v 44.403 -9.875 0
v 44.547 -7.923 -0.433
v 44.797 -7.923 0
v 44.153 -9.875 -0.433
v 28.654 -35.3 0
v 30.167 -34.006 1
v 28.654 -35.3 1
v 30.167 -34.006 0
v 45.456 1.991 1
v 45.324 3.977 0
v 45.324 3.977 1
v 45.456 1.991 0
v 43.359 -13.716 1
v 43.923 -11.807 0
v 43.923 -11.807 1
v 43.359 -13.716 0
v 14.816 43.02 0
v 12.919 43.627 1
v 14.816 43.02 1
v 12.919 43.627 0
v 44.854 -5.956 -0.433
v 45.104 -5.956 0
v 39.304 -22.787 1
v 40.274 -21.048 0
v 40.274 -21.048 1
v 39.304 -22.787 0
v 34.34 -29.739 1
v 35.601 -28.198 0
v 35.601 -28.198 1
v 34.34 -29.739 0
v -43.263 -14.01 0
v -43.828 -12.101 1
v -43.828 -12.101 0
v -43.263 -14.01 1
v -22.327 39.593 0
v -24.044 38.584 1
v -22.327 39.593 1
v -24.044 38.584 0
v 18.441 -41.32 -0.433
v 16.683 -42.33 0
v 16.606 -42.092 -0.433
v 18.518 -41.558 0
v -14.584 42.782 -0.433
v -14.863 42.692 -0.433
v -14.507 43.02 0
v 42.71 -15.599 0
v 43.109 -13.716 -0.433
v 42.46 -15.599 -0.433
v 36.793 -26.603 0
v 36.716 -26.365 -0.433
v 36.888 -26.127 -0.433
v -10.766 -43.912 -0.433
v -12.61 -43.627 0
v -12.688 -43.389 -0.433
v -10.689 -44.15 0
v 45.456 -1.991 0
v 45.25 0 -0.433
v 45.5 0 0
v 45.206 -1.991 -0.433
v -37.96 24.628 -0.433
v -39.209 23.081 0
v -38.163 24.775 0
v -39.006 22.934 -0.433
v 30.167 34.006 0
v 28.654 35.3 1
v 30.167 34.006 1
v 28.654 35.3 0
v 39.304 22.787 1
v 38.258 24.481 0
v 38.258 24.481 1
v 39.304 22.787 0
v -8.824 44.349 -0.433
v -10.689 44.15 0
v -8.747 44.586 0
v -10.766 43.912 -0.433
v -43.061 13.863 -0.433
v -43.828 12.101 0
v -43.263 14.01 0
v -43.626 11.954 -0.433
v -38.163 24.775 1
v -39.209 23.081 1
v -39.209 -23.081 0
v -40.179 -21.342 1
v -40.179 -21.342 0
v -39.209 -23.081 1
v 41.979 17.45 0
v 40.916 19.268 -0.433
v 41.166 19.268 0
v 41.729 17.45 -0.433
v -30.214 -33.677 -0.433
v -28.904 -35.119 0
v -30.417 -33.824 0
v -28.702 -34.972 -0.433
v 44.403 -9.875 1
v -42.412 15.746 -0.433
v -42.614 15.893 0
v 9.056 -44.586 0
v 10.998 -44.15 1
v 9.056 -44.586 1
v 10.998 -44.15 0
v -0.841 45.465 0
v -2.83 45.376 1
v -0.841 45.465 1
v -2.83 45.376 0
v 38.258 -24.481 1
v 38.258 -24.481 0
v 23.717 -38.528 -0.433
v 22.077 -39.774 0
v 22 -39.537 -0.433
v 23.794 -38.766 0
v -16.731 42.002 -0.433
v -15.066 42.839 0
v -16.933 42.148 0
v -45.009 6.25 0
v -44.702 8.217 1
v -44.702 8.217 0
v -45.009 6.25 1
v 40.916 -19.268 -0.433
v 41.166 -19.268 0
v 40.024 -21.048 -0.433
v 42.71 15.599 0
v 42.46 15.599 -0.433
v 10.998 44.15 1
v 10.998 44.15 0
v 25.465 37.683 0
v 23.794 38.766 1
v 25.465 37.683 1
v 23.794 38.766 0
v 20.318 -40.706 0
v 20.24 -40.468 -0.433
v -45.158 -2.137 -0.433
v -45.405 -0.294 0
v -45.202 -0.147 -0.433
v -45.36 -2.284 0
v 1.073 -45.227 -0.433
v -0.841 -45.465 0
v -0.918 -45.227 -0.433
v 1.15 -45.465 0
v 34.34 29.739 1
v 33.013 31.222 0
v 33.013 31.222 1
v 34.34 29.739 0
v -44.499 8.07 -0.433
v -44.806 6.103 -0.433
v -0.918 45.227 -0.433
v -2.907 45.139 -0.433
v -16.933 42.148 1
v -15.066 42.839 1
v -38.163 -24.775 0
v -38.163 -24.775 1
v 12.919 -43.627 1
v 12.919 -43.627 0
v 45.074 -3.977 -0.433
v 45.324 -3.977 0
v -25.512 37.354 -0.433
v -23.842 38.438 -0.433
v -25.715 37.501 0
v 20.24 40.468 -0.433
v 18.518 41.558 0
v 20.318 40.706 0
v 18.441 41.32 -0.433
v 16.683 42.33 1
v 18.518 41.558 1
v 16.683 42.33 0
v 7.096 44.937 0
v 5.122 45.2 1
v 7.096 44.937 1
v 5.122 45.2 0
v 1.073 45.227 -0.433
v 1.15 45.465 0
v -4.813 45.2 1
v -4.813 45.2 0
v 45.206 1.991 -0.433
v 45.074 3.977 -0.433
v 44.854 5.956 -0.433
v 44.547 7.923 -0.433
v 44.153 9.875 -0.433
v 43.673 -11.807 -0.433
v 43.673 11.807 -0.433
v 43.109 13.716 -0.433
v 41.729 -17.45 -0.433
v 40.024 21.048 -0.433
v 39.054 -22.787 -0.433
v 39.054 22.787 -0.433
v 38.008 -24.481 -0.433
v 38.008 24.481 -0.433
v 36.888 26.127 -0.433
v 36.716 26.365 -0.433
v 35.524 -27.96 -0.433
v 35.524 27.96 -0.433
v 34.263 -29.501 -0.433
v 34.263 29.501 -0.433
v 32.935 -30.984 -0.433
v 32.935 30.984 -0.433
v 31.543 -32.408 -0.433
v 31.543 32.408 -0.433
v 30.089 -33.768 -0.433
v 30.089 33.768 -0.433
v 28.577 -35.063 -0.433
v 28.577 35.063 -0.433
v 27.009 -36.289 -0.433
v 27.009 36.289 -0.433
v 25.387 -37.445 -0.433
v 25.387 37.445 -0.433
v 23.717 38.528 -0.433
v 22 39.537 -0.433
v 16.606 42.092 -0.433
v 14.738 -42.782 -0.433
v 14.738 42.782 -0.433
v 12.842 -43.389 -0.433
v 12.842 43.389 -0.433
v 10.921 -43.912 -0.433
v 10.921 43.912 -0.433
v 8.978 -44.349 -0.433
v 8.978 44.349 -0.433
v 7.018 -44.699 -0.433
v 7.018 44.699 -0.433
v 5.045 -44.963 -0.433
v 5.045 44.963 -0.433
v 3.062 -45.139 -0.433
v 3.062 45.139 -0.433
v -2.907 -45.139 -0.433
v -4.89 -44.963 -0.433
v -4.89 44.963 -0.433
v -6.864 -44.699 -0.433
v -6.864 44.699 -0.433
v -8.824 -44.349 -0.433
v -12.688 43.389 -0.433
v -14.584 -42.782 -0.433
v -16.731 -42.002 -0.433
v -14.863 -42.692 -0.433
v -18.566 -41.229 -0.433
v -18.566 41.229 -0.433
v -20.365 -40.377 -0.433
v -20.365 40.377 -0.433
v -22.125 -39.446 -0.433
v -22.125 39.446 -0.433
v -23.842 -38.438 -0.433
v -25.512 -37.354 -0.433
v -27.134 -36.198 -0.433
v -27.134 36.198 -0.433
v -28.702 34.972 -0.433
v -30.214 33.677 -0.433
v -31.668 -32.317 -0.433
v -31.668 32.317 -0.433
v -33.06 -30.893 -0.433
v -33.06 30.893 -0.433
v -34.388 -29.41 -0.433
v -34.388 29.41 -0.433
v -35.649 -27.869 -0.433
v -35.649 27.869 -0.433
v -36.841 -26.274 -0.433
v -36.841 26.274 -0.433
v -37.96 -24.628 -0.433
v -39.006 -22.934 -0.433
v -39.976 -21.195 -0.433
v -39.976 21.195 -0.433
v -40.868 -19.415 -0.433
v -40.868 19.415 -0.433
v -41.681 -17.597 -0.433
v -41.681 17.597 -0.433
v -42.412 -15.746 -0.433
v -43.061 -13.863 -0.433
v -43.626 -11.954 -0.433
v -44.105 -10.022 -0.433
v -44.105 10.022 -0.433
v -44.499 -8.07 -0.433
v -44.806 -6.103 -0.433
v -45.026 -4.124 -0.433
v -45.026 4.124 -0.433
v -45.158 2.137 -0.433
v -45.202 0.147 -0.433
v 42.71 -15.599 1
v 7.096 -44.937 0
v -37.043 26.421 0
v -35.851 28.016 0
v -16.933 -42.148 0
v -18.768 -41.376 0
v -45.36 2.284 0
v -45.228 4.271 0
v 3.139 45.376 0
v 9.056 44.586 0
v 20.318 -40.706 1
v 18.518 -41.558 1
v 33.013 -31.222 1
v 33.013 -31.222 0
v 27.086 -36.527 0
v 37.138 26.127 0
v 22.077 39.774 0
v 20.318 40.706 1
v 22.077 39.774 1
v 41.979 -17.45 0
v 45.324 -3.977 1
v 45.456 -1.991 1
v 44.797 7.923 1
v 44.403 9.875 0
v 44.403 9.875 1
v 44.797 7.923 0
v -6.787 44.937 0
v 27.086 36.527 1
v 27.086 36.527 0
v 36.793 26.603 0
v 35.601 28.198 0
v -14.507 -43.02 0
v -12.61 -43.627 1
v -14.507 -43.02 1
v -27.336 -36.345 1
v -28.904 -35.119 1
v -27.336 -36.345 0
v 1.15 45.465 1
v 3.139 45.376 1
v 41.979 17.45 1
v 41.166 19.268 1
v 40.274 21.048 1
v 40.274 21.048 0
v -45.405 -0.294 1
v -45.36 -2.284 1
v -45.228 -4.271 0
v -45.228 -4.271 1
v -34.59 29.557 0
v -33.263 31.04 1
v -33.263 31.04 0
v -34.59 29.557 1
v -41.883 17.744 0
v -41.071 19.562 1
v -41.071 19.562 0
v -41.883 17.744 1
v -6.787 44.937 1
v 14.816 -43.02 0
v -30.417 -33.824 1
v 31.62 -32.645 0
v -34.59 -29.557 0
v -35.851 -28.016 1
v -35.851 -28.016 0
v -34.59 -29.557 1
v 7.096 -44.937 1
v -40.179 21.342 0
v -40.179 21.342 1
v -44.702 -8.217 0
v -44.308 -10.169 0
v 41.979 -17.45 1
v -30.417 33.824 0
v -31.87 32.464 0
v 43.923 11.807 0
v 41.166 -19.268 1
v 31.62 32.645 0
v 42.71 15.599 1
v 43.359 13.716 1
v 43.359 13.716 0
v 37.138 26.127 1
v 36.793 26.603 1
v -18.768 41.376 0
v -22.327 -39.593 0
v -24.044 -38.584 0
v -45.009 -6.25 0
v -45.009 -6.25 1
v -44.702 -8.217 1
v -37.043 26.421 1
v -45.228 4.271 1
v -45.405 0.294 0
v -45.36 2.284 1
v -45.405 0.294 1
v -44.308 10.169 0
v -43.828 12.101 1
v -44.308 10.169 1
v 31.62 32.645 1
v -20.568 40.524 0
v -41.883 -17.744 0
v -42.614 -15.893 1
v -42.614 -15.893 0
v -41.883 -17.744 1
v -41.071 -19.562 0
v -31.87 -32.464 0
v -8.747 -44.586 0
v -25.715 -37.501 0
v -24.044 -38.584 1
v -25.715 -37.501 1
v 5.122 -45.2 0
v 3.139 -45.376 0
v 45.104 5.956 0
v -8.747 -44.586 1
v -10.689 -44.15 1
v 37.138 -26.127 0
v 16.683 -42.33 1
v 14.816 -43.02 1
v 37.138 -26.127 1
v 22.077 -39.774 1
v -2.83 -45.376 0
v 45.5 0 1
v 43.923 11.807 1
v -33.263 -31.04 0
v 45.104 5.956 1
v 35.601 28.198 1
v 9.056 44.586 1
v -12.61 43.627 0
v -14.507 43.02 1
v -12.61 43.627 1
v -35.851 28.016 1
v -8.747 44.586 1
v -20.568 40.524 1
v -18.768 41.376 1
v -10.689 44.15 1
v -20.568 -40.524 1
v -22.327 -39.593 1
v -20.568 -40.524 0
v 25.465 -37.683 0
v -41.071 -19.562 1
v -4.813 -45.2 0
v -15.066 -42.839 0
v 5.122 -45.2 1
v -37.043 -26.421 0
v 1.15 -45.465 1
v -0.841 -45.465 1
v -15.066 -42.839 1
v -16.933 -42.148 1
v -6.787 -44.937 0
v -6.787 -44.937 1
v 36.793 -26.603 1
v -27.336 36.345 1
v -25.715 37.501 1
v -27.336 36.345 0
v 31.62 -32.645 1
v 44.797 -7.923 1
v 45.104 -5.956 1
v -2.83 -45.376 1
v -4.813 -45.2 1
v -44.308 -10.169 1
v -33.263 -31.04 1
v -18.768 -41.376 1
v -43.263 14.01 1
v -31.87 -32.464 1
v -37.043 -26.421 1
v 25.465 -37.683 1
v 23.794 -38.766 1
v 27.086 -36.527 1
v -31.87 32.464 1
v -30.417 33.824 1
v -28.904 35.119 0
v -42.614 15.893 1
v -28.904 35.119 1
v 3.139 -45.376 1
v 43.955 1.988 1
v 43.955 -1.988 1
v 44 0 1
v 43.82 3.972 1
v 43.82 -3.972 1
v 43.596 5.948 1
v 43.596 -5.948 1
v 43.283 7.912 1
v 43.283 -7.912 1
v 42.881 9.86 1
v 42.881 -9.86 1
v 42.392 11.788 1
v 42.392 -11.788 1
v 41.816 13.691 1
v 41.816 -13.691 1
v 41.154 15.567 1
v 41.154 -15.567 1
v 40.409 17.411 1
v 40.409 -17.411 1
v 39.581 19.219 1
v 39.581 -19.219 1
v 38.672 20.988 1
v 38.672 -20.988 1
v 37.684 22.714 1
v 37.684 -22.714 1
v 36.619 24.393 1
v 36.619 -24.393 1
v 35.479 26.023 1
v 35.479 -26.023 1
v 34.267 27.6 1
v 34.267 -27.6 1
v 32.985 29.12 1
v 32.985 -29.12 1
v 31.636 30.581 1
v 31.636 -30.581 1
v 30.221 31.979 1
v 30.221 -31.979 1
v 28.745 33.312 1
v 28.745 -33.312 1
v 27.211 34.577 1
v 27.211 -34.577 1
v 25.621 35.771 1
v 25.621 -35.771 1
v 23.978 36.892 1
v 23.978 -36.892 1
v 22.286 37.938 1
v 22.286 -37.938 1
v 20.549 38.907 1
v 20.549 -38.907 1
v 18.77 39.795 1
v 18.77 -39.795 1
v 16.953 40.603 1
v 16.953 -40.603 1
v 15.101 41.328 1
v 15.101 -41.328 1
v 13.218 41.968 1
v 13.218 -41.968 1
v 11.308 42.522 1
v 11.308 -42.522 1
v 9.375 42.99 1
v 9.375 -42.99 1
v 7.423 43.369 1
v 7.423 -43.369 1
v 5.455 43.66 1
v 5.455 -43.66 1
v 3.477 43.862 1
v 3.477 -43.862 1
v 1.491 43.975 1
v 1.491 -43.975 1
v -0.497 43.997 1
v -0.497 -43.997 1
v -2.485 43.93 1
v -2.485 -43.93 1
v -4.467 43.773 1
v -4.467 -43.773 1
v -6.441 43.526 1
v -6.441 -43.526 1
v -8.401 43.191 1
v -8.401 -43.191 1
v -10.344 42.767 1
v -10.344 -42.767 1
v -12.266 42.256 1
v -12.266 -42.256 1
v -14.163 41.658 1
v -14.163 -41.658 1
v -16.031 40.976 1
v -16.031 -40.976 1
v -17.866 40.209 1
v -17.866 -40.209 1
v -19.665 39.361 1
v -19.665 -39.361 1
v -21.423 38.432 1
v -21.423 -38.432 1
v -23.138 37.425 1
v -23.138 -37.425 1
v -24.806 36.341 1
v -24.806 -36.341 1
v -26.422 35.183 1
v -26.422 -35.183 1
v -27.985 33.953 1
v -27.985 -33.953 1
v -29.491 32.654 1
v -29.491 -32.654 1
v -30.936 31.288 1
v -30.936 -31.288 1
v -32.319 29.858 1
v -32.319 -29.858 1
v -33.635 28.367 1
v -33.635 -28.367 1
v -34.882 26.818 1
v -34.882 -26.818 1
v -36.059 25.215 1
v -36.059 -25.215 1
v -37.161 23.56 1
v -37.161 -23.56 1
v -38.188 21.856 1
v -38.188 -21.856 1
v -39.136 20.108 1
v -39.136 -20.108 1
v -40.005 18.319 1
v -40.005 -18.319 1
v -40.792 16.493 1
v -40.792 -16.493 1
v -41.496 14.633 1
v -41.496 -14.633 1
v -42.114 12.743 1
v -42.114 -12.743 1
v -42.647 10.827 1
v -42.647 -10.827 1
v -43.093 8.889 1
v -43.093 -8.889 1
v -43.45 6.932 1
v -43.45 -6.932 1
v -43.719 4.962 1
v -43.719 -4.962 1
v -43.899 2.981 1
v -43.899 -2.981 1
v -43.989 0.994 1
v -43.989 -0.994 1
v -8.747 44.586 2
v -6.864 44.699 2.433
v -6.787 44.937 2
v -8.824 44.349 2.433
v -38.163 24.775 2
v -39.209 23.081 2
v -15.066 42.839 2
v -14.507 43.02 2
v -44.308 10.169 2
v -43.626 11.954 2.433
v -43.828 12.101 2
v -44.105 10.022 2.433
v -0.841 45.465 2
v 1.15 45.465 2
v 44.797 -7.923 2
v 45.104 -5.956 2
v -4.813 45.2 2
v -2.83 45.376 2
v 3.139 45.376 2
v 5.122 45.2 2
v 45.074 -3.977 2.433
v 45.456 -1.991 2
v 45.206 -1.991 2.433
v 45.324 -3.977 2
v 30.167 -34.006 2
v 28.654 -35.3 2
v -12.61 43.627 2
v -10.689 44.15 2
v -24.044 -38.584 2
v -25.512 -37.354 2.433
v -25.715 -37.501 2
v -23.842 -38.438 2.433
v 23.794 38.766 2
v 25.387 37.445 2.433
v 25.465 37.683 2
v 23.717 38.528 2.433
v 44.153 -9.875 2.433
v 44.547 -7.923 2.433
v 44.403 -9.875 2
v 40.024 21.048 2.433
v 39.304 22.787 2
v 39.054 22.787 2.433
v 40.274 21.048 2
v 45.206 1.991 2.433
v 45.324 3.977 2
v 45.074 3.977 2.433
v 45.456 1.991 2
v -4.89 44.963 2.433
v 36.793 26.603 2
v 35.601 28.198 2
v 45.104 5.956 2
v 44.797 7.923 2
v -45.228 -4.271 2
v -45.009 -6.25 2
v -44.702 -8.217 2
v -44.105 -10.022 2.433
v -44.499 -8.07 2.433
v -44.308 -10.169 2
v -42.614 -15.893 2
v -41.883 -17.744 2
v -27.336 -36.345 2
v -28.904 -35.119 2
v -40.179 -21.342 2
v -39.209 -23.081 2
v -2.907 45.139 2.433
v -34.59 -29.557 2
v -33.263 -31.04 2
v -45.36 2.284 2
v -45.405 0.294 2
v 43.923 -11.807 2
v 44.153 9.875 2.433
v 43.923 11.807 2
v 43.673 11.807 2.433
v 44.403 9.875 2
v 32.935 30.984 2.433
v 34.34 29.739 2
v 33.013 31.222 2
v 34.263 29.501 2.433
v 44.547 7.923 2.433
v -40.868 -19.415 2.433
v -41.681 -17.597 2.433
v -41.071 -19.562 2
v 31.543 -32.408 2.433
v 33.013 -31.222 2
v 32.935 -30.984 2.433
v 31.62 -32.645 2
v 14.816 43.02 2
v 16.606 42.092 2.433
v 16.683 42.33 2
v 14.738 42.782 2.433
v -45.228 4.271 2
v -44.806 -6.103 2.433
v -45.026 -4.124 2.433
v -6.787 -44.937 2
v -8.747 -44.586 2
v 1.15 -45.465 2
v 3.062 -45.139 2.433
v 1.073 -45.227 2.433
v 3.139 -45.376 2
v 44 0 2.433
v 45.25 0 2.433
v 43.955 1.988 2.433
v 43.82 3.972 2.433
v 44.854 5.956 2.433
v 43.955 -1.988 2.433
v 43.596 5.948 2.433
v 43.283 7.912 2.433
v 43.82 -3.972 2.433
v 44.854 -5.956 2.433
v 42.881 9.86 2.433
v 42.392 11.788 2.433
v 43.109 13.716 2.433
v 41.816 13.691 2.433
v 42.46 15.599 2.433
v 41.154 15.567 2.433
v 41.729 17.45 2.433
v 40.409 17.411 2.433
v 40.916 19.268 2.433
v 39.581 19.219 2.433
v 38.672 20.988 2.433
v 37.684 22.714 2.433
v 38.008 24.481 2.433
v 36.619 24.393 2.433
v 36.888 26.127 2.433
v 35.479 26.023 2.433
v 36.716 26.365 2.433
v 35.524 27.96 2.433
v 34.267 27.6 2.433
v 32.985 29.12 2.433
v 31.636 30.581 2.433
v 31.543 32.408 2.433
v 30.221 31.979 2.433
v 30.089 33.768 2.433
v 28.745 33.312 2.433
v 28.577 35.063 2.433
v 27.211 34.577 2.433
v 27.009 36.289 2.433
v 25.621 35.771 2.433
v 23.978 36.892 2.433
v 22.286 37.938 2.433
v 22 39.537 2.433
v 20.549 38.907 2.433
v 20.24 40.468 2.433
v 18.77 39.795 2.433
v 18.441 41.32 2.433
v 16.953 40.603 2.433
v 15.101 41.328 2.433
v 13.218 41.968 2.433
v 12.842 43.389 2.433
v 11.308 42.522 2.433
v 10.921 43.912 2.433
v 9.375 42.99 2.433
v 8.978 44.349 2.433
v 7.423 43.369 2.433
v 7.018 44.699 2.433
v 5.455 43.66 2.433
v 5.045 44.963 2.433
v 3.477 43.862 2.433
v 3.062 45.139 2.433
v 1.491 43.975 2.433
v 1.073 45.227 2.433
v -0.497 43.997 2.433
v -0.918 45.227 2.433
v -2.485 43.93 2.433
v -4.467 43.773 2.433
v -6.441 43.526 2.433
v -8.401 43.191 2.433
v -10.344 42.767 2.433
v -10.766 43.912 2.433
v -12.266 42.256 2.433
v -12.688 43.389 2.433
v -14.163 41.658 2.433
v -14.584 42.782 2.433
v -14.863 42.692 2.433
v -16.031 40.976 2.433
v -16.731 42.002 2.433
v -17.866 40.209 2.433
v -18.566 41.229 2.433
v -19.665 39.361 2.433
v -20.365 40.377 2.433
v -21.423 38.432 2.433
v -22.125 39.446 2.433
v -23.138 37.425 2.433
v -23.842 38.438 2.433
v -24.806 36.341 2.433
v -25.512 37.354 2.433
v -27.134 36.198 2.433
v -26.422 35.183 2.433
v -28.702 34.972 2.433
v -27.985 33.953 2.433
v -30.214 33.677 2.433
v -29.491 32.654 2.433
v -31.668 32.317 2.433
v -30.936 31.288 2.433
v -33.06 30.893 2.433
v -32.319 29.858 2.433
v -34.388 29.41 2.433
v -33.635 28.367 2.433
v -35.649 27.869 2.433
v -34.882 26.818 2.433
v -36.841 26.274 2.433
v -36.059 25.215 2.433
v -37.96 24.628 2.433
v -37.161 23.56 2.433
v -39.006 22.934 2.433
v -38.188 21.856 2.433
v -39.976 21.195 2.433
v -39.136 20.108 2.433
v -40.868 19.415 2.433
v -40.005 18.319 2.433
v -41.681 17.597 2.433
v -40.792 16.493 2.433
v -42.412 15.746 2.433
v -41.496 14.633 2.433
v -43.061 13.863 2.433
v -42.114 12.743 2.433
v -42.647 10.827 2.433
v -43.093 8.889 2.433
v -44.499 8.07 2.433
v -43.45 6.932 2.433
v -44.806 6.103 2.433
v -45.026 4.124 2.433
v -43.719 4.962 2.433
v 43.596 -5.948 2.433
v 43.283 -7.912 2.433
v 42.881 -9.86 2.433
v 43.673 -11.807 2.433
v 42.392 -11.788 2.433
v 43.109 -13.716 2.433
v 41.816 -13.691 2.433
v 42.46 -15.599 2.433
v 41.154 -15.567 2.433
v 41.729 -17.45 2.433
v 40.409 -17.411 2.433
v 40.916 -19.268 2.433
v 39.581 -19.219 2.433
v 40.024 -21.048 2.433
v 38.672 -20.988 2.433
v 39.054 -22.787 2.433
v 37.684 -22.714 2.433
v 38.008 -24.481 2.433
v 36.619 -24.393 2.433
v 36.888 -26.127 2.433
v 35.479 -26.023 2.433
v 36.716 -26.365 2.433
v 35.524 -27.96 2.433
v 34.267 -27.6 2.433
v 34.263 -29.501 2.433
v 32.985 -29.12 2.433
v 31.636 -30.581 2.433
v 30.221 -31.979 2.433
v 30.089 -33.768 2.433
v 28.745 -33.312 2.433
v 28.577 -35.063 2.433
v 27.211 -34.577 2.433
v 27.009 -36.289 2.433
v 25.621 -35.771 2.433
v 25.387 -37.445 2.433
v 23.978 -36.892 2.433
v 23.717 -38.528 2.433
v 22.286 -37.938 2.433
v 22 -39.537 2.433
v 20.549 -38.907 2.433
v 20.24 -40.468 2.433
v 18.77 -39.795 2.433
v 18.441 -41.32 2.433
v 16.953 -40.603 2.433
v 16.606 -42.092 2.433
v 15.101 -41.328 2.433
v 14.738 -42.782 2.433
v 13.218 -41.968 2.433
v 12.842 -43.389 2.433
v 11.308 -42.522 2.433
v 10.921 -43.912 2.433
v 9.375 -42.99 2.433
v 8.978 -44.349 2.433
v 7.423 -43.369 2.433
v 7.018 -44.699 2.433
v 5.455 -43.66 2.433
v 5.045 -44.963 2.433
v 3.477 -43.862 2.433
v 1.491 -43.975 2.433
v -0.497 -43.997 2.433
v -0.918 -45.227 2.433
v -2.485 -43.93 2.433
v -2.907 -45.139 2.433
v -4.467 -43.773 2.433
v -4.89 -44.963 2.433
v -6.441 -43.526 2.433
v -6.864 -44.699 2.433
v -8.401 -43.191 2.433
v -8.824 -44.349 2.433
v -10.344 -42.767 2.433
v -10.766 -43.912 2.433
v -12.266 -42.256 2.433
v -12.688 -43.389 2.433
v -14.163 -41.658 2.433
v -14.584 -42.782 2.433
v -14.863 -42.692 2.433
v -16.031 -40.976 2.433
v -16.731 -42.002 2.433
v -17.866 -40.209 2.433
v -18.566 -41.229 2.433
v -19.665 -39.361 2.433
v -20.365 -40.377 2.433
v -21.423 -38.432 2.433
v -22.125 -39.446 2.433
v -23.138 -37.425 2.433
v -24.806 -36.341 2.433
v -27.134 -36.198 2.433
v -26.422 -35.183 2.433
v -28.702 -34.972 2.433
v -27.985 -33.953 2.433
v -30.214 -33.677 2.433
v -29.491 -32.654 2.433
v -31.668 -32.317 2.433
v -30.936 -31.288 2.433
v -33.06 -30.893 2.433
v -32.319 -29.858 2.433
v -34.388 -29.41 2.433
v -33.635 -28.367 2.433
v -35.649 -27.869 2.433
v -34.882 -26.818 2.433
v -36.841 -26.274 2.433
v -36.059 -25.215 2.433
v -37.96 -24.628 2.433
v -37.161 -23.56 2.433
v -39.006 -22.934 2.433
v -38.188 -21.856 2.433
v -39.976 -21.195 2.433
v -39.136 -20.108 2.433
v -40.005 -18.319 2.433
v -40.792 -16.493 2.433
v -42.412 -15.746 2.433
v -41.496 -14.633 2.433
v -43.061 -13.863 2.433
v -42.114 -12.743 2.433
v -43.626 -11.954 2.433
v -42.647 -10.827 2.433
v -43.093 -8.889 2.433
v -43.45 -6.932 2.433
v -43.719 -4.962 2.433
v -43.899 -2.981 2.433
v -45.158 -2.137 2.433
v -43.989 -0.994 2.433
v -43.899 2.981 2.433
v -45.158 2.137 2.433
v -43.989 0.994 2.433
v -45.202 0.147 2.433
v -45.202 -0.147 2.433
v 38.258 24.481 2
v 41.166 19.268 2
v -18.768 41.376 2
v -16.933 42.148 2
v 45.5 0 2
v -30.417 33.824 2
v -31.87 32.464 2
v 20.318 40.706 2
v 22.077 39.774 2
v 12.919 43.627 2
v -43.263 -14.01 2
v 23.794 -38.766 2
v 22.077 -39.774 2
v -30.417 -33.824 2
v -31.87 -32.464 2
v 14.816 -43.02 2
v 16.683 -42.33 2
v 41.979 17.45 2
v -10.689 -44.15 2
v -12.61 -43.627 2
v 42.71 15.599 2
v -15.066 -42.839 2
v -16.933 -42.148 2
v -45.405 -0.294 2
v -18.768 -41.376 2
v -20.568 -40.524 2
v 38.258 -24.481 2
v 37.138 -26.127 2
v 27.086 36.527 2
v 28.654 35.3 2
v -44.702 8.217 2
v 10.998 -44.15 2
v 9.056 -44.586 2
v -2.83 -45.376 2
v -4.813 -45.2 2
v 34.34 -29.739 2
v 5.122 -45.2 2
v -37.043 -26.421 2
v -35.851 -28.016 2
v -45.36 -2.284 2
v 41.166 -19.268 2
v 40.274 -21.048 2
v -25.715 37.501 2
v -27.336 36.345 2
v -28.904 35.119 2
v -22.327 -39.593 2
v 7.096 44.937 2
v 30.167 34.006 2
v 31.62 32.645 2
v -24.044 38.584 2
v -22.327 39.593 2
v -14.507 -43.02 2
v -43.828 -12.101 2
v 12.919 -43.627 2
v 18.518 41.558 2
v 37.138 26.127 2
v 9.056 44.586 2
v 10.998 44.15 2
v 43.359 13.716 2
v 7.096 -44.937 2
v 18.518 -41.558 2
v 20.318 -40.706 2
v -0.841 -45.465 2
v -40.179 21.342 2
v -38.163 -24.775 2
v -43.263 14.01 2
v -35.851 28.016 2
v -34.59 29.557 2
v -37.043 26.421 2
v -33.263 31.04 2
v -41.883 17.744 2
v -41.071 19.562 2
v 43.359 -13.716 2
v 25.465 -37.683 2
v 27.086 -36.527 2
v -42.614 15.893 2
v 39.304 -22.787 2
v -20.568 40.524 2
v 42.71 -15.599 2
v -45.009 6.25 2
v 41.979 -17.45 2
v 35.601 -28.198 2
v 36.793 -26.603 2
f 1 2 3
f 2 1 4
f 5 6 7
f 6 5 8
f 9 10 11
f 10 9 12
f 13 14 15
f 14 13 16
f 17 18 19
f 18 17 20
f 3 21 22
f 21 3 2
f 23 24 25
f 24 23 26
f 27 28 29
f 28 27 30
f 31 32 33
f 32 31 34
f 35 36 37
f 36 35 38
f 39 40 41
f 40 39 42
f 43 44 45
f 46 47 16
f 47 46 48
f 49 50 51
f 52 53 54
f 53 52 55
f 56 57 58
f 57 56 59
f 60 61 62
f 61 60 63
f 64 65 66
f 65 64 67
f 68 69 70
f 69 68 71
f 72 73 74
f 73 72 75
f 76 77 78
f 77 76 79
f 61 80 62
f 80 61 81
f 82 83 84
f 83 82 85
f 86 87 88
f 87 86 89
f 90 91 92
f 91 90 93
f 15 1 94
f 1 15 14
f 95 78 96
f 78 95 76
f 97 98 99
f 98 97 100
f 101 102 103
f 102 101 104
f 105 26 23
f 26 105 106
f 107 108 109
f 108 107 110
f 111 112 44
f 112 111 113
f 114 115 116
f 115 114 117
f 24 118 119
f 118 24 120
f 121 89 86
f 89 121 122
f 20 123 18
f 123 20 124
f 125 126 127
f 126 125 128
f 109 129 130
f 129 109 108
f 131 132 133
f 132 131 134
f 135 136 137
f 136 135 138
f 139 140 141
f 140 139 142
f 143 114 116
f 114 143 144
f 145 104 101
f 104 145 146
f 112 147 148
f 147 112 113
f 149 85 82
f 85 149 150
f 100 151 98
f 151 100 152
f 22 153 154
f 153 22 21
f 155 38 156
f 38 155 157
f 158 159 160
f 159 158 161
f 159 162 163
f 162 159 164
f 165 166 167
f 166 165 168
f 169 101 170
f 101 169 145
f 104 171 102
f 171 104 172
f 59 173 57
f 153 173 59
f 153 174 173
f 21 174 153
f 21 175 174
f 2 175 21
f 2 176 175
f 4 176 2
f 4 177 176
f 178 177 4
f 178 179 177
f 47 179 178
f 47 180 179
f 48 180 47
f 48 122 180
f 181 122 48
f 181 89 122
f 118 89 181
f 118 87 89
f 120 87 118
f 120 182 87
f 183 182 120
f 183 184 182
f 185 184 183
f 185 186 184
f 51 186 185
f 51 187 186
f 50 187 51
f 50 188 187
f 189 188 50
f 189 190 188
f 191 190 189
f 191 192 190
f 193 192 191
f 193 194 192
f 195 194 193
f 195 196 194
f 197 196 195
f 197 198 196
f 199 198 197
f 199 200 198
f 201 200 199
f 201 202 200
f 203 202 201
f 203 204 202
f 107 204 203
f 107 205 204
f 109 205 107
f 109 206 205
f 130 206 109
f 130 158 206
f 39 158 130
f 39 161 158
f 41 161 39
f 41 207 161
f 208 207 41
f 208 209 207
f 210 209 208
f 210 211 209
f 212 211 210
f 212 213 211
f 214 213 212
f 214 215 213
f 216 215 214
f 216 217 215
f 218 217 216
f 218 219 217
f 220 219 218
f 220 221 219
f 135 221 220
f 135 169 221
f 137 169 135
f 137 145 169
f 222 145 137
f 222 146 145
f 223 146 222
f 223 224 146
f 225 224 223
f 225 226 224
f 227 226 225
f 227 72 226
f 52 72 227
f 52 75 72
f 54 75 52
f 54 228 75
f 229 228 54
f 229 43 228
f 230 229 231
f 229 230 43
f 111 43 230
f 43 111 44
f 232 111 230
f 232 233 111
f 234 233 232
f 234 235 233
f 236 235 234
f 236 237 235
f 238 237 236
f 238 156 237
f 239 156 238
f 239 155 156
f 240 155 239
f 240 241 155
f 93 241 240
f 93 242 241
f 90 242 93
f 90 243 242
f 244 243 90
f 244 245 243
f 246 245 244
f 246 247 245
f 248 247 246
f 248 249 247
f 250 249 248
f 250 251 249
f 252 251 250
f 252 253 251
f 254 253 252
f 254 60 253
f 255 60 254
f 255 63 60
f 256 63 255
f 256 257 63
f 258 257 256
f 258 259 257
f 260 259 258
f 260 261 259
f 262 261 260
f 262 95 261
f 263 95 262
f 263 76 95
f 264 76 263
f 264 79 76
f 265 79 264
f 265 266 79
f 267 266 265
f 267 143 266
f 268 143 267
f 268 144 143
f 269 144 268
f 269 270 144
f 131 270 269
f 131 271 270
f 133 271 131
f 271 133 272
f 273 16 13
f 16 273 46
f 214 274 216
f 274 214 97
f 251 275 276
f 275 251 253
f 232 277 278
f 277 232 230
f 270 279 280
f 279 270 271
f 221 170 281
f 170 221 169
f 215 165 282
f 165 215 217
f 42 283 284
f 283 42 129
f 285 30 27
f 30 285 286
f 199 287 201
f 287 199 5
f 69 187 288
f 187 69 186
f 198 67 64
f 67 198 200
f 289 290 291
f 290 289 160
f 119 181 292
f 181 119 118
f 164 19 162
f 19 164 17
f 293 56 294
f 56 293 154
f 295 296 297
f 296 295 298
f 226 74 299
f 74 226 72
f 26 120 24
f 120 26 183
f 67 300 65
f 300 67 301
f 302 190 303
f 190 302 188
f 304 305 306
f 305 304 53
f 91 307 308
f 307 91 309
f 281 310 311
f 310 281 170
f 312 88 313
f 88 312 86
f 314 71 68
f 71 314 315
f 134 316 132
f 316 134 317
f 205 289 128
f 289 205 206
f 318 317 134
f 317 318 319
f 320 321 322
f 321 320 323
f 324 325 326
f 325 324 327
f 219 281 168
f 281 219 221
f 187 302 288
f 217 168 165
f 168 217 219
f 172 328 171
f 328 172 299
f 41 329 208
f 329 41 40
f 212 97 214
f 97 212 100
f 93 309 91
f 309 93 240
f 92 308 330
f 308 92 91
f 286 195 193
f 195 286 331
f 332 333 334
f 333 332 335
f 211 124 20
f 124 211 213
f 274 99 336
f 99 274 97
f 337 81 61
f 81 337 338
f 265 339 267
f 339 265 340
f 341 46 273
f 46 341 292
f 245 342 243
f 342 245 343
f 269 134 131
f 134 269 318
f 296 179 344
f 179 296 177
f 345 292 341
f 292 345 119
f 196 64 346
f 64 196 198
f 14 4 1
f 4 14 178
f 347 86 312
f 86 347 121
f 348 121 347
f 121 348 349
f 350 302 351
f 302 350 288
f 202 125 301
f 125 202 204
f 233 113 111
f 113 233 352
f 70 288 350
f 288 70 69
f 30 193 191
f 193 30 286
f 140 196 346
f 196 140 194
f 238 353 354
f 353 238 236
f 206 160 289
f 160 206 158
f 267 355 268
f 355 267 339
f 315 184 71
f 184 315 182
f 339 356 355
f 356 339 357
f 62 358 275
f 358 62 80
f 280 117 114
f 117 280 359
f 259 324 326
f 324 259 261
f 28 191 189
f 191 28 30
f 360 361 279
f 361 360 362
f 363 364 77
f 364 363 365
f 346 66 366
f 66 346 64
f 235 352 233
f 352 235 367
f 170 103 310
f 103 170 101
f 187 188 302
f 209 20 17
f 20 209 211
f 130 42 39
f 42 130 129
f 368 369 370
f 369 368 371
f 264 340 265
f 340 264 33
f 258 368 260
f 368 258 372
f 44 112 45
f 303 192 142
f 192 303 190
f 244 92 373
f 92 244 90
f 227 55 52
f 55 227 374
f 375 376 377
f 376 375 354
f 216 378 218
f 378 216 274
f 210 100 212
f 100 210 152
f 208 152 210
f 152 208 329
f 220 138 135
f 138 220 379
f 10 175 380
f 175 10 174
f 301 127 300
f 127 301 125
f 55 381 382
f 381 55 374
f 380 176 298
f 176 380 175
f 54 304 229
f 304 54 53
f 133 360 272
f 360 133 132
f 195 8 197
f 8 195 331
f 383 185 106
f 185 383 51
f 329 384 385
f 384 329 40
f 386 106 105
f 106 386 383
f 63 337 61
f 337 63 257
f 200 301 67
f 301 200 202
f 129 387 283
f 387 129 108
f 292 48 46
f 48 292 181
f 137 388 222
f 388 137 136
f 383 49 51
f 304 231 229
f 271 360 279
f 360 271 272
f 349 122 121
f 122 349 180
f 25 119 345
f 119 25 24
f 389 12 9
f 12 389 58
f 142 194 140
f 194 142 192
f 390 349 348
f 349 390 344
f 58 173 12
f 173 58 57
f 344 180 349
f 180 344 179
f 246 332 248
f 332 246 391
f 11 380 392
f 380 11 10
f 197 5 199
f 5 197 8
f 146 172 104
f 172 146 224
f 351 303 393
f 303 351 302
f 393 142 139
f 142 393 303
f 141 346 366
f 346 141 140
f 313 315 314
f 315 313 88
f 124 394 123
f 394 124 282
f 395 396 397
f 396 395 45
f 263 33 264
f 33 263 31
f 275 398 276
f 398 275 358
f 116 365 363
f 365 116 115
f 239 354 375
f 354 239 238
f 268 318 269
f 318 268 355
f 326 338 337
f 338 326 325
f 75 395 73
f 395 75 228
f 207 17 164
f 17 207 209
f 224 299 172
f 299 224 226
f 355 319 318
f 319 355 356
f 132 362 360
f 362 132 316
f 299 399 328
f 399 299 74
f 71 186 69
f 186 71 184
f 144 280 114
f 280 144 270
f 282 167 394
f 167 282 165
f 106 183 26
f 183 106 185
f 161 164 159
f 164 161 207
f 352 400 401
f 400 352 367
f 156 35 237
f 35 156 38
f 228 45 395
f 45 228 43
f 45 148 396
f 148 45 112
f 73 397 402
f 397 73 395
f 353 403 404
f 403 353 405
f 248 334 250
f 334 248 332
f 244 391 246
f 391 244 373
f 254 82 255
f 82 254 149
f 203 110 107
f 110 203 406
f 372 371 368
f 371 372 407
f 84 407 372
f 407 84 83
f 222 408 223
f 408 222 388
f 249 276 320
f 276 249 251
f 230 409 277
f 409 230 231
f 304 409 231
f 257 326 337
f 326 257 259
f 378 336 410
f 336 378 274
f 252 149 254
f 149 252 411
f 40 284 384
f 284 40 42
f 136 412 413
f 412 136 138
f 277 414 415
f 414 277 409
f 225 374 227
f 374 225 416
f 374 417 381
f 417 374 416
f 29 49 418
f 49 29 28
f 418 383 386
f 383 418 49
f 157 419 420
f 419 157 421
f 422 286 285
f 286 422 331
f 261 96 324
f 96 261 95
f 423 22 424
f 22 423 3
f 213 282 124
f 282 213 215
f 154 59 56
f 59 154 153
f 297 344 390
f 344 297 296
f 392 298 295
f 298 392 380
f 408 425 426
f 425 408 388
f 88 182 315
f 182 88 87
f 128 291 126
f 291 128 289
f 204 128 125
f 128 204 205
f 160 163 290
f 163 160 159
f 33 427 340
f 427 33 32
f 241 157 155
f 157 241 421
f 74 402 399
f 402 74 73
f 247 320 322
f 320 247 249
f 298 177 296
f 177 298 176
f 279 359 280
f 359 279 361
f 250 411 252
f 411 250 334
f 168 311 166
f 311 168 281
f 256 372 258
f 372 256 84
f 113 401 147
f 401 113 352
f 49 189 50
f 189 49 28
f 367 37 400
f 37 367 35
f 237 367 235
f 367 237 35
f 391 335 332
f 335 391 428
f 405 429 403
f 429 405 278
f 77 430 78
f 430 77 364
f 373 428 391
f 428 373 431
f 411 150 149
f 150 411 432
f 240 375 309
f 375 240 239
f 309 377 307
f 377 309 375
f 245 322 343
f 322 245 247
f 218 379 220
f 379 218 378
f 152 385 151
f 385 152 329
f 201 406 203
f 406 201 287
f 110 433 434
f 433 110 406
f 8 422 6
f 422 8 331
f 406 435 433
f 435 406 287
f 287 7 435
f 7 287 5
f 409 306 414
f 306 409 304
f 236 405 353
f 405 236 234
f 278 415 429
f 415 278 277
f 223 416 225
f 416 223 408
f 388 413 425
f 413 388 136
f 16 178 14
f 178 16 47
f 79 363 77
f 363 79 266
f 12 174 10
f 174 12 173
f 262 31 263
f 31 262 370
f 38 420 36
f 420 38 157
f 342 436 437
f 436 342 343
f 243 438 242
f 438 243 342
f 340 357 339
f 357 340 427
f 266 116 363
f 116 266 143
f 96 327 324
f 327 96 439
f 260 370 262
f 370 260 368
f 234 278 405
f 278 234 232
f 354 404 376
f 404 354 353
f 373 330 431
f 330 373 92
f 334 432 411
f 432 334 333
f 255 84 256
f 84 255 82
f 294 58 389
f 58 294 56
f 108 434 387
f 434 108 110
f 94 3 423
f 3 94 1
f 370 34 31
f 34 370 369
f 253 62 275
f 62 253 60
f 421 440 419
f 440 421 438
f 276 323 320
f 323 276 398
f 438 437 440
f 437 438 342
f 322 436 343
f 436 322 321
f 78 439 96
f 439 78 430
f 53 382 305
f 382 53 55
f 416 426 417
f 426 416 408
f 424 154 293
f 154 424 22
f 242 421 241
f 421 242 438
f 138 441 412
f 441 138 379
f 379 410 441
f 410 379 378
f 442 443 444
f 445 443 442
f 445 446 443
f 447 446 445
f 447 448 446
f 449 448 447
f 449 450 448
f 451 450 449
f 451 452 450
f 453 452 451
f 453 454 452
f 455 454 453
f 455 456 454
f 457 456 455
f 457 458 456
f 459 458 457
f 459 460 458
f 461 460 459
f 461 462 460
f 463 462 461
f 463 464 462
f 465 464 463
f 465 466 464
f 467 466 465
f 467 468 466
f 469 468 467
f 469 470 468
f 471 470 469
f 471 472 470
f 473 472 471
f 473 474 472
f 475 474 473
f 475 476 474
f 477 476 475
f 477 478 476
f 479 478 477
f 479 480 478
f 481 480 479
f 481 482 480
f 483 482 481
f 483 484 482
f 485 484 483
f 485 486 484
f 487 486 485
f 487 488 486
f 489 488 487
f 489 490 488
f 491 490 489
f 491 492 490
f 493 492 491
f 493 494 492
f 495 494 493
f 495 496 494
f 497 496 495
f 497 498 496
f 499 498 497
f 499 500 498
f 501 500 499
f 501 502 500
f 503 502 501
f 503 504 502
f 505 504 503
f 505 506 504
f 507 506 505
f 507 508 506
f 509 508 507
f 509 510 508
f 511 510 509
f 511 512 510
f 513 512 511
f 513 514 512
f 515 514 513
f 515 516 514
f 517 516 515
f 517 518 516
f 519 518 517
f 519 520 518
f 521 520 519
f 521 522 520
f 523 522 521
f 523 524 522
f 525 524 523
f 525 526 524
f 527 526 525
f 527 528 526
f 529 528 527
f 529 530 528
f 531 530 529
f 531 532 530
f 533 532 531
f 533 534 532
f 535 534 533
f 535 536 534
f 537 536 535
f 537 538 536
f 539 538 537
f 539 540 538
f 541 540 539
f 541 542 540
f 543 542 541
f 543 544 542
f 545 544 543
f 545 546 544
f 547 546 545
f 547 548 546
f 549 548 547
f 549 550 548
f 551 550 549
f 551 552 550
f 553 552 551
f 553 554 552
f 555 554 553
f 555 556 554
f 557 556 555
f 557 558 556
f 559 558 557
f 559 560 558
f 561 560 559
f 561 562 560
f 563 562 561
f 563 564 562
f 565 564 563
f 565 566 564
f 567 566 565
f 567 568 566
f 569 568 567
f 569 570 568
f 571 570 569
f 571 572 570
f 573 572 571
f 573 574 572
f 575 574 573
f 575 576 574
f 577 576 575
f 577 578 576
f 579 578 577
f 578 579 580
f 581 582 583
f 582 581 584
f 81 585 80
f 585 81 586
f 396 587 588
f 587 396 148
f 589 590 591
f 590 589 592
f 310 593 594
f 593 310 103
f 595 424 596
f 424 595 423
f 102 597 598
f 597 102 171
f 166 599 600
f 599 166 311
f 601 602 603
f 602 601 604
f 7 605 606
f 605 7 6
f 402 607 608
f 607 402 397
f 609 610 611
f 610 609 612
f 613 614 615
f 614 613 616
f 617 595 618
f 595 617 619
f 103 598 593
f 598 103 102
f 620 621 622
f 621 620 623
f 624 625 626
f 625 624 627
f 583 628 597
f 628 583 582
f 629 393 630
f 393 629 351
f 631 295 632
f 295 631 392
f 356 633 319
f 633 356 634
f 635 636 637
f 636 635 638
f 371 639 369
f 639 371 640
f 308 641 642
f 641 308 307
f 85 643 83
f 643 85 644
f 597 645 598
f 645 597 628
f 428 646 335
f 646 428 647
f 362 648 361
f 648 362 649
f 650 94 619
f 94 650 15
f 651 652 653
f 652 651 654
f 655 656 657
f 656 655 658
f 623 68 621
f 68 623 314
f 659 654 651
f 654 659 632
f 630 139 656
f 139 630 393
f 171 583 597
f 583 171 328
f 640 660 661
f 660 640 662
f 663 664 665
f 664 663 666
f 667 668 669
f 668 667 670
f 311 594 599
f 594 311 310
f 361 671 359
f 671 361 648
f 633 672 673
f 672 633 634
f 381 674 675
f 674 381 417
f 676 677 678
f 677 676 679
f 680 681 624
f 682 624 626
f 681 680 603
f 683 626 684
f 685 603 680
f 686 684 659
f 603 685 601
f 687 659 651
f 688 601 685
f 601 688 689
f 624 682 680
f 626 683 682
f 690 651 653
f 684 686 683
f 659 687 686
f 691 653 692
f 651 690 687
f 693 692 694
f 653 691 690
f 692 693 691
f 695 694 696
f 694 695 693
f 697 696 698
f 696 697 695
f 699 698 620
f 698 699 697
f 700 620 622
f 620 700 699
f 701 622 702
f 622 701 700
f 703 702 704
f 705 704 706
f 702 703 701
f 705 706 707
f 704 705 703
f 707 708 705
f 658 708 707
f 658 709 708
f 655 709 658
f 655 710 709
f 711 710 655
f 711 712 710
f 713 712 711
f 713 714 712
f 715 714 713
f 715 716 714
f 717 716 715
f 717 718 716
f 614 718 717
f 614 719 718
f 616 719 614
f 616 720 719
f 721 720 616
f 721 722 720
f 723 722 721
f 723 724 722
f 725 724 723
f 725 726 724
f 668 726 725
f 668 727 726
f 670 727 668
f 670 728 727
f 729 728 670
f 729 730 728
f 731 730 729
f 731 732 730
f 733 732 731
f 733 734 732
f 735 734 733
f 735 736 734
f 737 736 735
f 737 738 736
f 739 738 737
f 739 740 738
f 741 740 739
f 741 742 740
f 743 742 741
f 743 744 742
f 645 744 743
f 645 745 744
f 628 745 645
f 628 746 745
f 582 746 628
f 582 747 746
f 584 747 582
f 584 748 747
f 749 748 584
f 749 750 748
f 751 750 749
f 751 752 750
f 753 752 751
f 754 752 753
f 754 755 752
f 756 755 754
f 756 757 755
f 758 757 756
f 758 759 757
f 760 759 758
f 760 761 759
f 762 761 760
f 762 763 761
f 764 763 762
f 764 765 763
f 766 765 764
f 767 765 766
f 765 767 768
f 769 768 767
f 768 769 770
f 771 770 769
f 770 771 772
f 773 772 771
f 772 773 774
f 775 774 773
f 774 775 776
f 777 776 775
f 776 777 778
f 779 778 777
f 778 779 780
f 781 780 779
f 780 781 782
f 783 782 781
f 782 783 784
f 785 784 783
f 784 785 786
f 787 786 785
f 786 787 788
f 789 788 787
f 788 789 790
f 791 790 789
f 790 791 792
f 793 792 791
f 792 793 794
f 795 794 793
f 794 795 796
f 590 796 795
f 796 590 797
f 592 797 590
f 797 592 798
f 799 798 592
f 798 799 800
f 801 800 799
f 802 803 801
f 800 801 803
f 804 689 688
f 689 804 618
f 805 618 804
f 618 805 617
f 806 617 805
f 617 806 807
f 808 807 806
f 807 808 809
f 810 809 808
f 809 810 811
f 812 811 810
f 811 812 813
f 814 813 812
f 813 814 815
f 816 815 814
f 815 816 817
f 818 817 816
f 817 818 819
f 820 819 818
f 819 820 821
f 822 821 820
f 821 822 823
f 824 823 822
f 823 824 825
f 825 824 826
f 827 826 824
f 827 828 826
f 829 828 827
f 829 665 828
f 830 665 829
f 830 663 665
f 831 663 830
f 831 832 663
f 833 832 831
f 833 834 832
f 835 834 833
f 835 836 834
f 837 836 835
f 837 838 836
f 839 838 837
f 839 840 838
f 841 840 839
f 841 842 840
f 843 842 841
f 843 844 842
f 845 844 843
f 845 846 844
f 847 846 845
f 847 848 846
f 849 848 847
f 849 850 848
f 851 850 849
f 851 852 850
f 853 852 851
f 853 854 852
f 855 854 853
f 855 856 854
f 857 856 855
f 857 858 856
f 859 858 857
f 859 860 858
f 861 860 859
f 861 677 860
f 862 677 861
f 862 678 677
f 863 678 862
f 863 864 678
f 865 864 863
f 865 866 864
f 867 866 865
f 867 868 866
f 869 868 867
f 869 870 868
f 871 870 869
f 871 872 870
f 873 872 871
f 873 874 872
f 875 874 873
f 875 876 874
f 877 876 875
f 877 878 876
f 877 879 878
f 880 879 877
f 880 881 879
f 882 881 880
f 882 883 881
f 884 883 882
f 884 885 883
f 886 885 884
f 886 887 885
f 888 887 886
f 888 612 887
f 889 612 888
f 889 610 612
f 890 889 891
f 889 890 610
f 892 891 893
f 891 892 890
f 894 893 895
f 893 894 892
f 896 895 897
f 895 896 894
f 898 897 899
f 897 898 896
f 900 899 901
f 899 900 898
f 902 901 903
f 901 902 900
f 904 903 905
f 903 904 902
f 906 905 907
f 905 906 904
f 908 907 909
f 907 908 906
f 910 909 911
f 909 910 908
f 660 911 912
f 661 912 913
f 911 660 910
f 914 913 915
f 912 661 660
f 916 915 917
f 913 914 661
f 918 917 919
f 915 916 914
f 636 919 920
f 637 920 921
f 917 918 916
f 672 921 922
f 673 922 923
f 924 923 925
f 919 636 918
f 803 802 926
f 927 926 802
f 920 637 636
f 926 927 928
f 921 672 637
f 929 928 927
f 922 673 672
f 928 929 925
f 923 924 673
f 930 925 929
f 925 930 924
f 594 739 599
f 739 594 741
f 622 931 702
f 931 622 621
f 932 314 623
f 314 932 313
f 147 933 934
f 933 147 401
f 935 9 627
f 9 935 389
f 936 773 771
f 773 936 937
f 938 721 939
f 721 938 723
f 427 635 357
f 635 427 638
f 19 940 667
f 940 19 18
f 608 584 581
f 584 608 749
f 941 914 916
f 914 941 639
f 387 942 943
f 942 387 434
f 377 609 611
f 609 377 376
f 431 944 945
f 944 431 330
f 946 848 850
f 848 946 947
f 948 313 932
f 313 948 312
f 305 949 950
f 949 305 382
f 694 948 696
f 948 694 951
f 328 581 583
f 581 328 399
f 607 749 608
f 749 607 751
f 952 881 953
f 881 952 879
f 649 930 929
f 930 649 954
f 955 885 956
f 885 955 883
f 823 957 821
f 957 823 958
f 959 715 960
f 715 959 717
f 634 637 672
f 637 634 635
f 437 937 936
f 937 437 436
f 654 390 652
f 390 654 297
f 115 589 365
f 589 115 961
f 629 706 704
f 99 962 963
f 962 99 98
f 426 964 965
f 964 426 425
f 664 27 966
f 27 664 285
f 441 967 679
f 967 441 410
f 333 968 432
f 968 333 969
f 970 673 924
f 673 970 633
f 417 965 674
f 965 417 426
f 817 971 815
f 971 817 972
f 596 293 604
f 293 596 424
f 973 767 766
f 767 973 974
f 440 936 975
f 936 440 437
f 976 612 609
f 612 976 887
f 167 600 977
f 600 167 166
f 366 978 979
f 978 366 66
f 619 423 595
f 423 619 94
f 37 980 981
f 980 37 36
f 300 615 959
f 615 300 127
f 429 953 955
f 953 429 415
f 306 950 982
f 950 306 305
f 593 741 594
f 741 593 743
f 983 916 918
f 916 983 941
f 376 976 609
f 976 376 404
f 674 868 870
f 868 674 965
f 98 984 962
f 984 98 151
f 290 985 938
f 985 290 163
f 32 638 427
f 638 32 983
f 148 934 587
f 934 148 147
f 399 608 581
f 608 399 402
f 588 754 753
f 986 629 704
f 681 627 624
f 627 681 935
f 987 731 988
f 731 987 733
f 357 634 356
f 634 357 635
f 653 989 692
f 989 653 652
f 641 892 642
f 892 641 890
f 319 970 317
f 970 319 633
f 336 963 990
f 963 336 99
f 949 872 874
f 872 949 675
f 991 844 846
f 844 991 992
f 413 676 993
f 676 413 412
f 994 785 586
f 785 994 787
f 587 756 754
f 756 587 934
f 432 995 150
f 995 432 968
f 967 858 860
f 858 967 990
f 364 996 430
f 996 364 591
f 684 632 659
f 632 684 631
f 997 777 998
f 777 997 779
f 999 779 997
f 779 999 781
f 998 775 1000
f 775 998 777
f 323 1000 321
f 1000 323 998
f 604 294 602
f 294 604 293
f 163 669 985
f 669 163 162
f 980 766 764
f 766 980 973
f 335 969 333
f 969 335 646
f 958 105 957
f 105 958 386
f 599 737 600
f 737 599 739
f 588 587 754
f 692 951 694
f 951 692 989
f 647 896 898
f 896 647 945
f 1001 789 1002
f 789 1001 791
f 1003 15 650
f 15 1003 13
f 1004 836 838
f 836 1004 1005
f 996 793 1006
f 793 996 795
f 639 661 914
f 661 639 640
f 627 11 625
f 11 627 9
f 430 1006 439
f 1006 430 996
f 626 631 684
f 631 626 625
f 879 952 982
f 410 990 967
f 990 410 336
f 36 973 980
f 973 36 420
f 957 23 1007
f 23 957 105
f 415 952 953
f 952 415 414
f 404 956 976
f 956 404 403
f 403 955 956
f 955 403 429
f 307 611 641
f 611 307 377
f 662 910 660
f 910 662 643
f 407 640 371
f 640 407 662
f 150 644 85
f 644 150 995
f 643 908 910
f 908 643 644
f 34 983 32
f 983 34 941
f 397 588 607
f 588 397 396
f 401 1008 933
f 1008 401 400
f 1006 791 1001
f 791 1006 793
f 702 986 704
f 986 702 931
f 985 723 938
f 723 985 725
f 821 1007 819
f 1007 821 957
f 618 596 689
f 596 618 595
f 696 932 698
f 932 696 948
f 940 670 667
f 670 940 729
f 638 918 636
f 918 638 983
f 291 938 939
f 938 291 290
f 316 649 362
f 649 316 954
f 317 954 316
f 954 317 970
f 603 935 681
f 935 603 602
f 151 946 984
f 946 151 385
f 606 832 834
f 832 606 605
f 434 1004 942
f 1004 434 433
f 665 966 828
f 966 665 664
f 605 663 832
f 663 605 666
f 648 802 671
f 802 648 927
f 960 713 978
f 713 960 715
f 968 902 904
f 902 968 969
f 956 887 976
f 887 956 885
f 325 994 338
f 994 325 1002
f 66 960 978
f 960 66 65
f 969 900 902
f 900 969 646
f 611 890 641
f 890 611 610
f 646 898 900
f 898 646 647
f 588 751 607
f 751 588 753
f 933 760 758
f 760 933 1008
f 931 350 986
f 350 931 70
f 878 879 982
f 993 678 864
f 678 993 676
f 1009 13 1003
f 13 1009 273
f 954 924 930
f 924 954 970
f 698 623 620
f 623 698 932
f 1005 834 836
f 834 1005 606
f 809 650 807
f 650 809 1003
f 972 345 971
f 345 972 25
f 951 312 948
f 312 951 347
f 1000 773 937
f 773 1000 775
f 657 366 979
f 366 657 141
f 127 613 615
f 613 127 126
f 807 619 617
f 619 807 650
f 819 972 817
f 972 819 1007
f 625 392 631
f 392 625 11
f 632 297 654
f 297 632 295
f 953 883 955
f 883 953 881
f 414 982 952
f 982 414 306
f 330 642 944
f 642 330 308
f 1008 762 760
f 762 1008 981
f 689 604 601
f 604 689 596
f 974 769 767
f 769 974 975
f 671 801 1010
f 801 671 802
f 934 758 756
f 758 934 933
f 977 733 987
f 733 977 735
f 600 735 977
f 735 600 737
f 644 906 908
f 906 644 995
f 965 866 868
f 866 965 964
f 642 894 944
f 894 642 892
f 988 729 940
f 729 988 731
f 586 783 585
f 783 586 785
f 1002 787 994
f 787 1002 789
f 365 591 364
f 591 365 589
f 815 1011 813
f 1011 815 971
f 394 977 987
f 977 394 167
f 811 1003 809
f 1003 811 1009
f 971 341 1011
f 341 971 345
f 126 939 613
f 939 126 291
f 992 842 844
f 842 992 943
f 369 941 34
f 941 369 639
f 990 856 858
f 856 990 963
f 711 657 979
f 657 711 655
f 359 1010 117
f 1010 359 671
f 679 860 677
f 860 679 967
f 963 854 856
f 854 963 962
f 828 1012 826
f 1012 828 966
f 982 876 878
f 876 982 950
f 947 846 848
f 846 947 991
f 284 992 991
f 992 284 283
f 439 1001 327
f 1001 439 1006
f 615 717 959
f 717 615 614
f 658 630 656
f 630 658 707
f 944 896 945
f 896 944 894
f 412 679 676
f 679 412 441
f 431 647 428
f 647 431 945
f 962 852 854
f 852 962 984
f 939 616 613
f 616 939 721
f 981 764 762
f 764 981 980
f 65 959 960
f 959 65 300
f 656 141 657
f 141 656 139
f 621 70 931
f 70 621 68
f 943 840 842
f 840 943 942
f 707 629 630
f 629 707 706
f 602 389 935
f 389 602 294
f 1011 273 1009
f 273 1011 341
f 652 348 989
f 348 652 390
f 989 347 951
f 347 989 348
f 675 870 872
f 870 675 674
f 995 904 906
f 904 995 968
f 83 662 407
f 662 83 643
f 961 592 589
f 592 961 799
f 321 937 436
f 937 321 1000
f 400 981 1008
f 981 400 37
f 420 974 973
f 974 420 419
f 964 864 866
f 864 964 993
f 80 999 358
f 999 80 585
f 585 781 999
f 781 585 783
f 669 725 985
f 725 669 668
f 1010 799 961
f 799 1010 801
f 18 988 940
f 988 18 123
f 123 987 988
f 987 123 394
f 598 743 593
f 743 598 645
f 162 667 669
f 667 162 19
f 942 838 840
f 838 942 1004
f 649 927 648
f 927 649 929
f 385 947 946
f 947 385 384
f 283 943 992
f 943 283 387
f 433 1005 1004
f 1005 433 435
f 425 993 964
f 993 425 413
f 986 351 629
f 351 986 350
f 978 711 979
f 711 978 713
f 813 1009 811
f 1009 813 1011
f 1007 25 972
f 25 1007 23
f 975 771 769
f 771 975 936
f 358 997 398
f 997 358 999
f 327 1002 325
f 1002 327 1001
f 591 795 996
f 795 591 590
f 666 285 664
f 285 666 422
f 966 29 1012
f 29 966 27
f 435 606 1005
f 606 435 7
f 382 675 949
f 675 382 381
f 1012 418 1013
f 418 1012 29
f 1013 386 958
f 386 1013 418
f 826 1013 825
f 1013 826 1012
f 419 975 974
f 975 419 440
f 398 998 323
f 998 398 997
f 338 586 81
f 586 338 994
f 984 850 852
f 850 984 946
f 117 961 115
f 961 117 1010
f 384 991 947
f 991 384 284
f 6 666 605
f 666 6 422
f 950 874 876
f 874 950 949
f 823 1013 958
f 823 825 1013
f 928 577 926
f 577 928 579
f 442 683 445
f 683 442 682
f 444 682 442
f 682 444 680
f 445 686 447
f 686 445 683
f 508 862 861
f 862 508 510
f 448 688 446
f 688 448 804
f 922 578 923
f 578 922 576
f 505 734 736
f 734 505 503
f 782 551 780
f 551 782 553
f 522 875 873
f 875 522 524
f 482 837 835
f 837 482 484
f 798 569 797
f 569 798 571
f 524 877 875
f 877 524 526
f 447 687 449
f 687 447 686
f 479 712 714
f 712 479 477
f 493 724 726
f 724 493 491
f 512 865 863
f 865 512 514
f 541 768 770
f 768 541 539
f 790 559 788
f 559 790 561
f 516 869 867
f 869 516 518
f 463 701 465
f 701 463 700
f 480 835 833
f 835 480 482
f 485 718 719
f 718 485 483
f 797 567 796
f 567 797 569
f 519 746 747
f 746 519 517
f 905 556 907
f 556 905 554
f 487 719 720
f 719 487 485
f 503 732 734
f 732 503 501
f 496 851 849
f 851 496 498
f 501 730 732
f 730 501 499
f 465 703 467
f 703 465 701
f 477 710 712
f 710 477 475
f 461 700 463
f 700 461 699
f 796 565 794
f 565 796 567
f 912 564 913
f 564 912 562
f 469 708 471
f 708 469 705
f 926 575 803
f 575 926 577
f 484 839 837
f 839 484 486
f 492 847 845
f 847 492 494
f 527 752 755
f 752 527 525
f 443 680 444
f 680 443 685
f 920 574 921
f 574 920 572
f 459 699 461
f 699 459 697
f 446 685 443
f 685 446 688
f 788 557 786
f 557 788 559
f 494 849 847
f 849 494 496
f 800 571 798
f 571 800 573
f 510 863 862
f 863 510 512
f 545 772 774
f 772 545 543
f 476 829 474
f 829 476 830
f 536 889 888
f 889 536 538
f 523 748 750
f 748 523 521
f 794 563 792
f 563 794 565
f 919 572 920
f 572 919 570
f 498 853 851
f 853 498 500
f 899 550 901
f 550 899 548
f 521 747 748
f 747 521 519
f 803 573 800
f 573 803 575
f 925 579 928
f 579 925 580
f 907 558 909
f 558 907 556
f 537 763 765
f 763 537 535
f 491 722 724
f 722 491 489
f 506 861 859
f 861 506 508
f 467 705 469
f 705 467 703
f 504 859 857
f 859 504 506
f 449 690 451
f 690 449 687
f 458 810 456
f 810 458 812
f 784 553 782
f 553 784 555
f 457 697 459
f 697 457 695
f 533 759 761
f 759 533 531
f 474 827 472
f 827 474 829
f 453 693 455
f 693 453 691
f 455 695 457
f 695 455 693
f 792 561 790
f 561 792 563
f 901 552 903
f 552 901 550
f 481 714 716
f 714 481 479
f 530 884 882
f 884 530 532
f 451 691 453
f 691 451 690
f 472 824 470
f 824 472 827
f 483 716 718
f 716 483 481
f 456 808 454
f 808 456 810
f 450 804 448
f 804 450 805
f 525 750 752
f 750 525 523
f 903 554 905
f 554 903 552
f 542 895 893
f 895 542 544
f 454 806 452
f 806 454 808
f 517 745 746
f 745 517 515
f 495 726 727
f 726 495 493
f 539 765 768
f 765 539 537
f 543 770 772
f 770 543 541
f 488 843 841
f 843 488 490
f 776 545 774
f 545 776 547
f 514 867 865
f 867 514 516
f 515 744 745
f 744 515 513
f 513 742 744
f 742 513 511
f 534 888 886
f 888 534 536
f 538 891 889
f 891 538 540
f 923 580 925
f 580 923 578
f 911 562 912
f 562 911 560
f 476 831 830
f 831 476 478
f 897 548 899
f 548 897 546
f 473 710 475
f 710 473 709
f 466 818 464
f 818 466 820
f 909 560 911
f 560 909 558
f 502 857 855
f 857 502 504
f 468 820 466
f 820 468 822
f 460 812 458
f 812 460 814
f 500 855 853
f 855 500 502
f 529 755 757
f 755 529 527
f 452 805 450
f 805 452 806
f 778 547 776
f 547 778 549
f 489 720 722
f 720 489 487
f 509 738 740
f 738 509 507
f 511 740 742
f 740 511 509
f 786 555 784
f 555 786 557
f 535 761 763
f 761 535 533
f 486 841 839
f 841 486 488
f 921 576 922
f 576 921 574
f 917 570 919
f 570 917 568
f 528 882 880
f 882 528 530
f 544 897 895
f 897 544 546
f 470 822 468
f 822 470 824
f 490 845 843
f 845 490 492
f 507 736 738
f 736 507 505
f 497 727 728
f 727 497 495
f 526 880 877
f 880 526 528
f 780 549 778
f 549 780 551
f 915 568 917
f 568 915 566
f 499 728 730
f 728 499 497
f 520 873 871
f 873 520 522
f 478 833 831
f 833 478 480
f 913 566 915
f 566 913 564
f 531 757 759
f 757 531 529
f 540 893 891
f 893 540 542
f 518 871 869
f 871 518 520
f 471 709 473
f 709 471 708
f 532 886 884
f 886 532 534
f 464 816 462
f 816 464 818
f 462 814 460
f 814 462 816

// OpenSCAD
$fa=1;
RADIUS=45;
HEIGHT_BASE=1;
HEIGHT_RIM=1;
WIDTH_RIM=1;
OVERLAP=20;
module base() {
    difference() {
        minkowski() {
            cylinder(r=RADIUS, h=OVERLAP);
            sphere(r=0.5);
        }
        translate([0,0,HEIGHT_BASE]) cylinder(r=RADIUS+5, h=OVERLAP);
    }
}

module rim() {
    difference() {
        minkowski() {
            cylinder(r=RADIUS, h=HEIGHT_RIM+HEIGHT_BASE);
            sphere(r=0.5);
        }
        translate([0,0,-OVERLAP/2]) cylinder(r=RADIUS-WIDTH_RIM, h=OVERLAP);
        translate([0,0,HEIGHT_BASE-OVERLAP]) cylinder(r=RADIUS+5, h=OVERLAP);
    }
}

base();
rim();
